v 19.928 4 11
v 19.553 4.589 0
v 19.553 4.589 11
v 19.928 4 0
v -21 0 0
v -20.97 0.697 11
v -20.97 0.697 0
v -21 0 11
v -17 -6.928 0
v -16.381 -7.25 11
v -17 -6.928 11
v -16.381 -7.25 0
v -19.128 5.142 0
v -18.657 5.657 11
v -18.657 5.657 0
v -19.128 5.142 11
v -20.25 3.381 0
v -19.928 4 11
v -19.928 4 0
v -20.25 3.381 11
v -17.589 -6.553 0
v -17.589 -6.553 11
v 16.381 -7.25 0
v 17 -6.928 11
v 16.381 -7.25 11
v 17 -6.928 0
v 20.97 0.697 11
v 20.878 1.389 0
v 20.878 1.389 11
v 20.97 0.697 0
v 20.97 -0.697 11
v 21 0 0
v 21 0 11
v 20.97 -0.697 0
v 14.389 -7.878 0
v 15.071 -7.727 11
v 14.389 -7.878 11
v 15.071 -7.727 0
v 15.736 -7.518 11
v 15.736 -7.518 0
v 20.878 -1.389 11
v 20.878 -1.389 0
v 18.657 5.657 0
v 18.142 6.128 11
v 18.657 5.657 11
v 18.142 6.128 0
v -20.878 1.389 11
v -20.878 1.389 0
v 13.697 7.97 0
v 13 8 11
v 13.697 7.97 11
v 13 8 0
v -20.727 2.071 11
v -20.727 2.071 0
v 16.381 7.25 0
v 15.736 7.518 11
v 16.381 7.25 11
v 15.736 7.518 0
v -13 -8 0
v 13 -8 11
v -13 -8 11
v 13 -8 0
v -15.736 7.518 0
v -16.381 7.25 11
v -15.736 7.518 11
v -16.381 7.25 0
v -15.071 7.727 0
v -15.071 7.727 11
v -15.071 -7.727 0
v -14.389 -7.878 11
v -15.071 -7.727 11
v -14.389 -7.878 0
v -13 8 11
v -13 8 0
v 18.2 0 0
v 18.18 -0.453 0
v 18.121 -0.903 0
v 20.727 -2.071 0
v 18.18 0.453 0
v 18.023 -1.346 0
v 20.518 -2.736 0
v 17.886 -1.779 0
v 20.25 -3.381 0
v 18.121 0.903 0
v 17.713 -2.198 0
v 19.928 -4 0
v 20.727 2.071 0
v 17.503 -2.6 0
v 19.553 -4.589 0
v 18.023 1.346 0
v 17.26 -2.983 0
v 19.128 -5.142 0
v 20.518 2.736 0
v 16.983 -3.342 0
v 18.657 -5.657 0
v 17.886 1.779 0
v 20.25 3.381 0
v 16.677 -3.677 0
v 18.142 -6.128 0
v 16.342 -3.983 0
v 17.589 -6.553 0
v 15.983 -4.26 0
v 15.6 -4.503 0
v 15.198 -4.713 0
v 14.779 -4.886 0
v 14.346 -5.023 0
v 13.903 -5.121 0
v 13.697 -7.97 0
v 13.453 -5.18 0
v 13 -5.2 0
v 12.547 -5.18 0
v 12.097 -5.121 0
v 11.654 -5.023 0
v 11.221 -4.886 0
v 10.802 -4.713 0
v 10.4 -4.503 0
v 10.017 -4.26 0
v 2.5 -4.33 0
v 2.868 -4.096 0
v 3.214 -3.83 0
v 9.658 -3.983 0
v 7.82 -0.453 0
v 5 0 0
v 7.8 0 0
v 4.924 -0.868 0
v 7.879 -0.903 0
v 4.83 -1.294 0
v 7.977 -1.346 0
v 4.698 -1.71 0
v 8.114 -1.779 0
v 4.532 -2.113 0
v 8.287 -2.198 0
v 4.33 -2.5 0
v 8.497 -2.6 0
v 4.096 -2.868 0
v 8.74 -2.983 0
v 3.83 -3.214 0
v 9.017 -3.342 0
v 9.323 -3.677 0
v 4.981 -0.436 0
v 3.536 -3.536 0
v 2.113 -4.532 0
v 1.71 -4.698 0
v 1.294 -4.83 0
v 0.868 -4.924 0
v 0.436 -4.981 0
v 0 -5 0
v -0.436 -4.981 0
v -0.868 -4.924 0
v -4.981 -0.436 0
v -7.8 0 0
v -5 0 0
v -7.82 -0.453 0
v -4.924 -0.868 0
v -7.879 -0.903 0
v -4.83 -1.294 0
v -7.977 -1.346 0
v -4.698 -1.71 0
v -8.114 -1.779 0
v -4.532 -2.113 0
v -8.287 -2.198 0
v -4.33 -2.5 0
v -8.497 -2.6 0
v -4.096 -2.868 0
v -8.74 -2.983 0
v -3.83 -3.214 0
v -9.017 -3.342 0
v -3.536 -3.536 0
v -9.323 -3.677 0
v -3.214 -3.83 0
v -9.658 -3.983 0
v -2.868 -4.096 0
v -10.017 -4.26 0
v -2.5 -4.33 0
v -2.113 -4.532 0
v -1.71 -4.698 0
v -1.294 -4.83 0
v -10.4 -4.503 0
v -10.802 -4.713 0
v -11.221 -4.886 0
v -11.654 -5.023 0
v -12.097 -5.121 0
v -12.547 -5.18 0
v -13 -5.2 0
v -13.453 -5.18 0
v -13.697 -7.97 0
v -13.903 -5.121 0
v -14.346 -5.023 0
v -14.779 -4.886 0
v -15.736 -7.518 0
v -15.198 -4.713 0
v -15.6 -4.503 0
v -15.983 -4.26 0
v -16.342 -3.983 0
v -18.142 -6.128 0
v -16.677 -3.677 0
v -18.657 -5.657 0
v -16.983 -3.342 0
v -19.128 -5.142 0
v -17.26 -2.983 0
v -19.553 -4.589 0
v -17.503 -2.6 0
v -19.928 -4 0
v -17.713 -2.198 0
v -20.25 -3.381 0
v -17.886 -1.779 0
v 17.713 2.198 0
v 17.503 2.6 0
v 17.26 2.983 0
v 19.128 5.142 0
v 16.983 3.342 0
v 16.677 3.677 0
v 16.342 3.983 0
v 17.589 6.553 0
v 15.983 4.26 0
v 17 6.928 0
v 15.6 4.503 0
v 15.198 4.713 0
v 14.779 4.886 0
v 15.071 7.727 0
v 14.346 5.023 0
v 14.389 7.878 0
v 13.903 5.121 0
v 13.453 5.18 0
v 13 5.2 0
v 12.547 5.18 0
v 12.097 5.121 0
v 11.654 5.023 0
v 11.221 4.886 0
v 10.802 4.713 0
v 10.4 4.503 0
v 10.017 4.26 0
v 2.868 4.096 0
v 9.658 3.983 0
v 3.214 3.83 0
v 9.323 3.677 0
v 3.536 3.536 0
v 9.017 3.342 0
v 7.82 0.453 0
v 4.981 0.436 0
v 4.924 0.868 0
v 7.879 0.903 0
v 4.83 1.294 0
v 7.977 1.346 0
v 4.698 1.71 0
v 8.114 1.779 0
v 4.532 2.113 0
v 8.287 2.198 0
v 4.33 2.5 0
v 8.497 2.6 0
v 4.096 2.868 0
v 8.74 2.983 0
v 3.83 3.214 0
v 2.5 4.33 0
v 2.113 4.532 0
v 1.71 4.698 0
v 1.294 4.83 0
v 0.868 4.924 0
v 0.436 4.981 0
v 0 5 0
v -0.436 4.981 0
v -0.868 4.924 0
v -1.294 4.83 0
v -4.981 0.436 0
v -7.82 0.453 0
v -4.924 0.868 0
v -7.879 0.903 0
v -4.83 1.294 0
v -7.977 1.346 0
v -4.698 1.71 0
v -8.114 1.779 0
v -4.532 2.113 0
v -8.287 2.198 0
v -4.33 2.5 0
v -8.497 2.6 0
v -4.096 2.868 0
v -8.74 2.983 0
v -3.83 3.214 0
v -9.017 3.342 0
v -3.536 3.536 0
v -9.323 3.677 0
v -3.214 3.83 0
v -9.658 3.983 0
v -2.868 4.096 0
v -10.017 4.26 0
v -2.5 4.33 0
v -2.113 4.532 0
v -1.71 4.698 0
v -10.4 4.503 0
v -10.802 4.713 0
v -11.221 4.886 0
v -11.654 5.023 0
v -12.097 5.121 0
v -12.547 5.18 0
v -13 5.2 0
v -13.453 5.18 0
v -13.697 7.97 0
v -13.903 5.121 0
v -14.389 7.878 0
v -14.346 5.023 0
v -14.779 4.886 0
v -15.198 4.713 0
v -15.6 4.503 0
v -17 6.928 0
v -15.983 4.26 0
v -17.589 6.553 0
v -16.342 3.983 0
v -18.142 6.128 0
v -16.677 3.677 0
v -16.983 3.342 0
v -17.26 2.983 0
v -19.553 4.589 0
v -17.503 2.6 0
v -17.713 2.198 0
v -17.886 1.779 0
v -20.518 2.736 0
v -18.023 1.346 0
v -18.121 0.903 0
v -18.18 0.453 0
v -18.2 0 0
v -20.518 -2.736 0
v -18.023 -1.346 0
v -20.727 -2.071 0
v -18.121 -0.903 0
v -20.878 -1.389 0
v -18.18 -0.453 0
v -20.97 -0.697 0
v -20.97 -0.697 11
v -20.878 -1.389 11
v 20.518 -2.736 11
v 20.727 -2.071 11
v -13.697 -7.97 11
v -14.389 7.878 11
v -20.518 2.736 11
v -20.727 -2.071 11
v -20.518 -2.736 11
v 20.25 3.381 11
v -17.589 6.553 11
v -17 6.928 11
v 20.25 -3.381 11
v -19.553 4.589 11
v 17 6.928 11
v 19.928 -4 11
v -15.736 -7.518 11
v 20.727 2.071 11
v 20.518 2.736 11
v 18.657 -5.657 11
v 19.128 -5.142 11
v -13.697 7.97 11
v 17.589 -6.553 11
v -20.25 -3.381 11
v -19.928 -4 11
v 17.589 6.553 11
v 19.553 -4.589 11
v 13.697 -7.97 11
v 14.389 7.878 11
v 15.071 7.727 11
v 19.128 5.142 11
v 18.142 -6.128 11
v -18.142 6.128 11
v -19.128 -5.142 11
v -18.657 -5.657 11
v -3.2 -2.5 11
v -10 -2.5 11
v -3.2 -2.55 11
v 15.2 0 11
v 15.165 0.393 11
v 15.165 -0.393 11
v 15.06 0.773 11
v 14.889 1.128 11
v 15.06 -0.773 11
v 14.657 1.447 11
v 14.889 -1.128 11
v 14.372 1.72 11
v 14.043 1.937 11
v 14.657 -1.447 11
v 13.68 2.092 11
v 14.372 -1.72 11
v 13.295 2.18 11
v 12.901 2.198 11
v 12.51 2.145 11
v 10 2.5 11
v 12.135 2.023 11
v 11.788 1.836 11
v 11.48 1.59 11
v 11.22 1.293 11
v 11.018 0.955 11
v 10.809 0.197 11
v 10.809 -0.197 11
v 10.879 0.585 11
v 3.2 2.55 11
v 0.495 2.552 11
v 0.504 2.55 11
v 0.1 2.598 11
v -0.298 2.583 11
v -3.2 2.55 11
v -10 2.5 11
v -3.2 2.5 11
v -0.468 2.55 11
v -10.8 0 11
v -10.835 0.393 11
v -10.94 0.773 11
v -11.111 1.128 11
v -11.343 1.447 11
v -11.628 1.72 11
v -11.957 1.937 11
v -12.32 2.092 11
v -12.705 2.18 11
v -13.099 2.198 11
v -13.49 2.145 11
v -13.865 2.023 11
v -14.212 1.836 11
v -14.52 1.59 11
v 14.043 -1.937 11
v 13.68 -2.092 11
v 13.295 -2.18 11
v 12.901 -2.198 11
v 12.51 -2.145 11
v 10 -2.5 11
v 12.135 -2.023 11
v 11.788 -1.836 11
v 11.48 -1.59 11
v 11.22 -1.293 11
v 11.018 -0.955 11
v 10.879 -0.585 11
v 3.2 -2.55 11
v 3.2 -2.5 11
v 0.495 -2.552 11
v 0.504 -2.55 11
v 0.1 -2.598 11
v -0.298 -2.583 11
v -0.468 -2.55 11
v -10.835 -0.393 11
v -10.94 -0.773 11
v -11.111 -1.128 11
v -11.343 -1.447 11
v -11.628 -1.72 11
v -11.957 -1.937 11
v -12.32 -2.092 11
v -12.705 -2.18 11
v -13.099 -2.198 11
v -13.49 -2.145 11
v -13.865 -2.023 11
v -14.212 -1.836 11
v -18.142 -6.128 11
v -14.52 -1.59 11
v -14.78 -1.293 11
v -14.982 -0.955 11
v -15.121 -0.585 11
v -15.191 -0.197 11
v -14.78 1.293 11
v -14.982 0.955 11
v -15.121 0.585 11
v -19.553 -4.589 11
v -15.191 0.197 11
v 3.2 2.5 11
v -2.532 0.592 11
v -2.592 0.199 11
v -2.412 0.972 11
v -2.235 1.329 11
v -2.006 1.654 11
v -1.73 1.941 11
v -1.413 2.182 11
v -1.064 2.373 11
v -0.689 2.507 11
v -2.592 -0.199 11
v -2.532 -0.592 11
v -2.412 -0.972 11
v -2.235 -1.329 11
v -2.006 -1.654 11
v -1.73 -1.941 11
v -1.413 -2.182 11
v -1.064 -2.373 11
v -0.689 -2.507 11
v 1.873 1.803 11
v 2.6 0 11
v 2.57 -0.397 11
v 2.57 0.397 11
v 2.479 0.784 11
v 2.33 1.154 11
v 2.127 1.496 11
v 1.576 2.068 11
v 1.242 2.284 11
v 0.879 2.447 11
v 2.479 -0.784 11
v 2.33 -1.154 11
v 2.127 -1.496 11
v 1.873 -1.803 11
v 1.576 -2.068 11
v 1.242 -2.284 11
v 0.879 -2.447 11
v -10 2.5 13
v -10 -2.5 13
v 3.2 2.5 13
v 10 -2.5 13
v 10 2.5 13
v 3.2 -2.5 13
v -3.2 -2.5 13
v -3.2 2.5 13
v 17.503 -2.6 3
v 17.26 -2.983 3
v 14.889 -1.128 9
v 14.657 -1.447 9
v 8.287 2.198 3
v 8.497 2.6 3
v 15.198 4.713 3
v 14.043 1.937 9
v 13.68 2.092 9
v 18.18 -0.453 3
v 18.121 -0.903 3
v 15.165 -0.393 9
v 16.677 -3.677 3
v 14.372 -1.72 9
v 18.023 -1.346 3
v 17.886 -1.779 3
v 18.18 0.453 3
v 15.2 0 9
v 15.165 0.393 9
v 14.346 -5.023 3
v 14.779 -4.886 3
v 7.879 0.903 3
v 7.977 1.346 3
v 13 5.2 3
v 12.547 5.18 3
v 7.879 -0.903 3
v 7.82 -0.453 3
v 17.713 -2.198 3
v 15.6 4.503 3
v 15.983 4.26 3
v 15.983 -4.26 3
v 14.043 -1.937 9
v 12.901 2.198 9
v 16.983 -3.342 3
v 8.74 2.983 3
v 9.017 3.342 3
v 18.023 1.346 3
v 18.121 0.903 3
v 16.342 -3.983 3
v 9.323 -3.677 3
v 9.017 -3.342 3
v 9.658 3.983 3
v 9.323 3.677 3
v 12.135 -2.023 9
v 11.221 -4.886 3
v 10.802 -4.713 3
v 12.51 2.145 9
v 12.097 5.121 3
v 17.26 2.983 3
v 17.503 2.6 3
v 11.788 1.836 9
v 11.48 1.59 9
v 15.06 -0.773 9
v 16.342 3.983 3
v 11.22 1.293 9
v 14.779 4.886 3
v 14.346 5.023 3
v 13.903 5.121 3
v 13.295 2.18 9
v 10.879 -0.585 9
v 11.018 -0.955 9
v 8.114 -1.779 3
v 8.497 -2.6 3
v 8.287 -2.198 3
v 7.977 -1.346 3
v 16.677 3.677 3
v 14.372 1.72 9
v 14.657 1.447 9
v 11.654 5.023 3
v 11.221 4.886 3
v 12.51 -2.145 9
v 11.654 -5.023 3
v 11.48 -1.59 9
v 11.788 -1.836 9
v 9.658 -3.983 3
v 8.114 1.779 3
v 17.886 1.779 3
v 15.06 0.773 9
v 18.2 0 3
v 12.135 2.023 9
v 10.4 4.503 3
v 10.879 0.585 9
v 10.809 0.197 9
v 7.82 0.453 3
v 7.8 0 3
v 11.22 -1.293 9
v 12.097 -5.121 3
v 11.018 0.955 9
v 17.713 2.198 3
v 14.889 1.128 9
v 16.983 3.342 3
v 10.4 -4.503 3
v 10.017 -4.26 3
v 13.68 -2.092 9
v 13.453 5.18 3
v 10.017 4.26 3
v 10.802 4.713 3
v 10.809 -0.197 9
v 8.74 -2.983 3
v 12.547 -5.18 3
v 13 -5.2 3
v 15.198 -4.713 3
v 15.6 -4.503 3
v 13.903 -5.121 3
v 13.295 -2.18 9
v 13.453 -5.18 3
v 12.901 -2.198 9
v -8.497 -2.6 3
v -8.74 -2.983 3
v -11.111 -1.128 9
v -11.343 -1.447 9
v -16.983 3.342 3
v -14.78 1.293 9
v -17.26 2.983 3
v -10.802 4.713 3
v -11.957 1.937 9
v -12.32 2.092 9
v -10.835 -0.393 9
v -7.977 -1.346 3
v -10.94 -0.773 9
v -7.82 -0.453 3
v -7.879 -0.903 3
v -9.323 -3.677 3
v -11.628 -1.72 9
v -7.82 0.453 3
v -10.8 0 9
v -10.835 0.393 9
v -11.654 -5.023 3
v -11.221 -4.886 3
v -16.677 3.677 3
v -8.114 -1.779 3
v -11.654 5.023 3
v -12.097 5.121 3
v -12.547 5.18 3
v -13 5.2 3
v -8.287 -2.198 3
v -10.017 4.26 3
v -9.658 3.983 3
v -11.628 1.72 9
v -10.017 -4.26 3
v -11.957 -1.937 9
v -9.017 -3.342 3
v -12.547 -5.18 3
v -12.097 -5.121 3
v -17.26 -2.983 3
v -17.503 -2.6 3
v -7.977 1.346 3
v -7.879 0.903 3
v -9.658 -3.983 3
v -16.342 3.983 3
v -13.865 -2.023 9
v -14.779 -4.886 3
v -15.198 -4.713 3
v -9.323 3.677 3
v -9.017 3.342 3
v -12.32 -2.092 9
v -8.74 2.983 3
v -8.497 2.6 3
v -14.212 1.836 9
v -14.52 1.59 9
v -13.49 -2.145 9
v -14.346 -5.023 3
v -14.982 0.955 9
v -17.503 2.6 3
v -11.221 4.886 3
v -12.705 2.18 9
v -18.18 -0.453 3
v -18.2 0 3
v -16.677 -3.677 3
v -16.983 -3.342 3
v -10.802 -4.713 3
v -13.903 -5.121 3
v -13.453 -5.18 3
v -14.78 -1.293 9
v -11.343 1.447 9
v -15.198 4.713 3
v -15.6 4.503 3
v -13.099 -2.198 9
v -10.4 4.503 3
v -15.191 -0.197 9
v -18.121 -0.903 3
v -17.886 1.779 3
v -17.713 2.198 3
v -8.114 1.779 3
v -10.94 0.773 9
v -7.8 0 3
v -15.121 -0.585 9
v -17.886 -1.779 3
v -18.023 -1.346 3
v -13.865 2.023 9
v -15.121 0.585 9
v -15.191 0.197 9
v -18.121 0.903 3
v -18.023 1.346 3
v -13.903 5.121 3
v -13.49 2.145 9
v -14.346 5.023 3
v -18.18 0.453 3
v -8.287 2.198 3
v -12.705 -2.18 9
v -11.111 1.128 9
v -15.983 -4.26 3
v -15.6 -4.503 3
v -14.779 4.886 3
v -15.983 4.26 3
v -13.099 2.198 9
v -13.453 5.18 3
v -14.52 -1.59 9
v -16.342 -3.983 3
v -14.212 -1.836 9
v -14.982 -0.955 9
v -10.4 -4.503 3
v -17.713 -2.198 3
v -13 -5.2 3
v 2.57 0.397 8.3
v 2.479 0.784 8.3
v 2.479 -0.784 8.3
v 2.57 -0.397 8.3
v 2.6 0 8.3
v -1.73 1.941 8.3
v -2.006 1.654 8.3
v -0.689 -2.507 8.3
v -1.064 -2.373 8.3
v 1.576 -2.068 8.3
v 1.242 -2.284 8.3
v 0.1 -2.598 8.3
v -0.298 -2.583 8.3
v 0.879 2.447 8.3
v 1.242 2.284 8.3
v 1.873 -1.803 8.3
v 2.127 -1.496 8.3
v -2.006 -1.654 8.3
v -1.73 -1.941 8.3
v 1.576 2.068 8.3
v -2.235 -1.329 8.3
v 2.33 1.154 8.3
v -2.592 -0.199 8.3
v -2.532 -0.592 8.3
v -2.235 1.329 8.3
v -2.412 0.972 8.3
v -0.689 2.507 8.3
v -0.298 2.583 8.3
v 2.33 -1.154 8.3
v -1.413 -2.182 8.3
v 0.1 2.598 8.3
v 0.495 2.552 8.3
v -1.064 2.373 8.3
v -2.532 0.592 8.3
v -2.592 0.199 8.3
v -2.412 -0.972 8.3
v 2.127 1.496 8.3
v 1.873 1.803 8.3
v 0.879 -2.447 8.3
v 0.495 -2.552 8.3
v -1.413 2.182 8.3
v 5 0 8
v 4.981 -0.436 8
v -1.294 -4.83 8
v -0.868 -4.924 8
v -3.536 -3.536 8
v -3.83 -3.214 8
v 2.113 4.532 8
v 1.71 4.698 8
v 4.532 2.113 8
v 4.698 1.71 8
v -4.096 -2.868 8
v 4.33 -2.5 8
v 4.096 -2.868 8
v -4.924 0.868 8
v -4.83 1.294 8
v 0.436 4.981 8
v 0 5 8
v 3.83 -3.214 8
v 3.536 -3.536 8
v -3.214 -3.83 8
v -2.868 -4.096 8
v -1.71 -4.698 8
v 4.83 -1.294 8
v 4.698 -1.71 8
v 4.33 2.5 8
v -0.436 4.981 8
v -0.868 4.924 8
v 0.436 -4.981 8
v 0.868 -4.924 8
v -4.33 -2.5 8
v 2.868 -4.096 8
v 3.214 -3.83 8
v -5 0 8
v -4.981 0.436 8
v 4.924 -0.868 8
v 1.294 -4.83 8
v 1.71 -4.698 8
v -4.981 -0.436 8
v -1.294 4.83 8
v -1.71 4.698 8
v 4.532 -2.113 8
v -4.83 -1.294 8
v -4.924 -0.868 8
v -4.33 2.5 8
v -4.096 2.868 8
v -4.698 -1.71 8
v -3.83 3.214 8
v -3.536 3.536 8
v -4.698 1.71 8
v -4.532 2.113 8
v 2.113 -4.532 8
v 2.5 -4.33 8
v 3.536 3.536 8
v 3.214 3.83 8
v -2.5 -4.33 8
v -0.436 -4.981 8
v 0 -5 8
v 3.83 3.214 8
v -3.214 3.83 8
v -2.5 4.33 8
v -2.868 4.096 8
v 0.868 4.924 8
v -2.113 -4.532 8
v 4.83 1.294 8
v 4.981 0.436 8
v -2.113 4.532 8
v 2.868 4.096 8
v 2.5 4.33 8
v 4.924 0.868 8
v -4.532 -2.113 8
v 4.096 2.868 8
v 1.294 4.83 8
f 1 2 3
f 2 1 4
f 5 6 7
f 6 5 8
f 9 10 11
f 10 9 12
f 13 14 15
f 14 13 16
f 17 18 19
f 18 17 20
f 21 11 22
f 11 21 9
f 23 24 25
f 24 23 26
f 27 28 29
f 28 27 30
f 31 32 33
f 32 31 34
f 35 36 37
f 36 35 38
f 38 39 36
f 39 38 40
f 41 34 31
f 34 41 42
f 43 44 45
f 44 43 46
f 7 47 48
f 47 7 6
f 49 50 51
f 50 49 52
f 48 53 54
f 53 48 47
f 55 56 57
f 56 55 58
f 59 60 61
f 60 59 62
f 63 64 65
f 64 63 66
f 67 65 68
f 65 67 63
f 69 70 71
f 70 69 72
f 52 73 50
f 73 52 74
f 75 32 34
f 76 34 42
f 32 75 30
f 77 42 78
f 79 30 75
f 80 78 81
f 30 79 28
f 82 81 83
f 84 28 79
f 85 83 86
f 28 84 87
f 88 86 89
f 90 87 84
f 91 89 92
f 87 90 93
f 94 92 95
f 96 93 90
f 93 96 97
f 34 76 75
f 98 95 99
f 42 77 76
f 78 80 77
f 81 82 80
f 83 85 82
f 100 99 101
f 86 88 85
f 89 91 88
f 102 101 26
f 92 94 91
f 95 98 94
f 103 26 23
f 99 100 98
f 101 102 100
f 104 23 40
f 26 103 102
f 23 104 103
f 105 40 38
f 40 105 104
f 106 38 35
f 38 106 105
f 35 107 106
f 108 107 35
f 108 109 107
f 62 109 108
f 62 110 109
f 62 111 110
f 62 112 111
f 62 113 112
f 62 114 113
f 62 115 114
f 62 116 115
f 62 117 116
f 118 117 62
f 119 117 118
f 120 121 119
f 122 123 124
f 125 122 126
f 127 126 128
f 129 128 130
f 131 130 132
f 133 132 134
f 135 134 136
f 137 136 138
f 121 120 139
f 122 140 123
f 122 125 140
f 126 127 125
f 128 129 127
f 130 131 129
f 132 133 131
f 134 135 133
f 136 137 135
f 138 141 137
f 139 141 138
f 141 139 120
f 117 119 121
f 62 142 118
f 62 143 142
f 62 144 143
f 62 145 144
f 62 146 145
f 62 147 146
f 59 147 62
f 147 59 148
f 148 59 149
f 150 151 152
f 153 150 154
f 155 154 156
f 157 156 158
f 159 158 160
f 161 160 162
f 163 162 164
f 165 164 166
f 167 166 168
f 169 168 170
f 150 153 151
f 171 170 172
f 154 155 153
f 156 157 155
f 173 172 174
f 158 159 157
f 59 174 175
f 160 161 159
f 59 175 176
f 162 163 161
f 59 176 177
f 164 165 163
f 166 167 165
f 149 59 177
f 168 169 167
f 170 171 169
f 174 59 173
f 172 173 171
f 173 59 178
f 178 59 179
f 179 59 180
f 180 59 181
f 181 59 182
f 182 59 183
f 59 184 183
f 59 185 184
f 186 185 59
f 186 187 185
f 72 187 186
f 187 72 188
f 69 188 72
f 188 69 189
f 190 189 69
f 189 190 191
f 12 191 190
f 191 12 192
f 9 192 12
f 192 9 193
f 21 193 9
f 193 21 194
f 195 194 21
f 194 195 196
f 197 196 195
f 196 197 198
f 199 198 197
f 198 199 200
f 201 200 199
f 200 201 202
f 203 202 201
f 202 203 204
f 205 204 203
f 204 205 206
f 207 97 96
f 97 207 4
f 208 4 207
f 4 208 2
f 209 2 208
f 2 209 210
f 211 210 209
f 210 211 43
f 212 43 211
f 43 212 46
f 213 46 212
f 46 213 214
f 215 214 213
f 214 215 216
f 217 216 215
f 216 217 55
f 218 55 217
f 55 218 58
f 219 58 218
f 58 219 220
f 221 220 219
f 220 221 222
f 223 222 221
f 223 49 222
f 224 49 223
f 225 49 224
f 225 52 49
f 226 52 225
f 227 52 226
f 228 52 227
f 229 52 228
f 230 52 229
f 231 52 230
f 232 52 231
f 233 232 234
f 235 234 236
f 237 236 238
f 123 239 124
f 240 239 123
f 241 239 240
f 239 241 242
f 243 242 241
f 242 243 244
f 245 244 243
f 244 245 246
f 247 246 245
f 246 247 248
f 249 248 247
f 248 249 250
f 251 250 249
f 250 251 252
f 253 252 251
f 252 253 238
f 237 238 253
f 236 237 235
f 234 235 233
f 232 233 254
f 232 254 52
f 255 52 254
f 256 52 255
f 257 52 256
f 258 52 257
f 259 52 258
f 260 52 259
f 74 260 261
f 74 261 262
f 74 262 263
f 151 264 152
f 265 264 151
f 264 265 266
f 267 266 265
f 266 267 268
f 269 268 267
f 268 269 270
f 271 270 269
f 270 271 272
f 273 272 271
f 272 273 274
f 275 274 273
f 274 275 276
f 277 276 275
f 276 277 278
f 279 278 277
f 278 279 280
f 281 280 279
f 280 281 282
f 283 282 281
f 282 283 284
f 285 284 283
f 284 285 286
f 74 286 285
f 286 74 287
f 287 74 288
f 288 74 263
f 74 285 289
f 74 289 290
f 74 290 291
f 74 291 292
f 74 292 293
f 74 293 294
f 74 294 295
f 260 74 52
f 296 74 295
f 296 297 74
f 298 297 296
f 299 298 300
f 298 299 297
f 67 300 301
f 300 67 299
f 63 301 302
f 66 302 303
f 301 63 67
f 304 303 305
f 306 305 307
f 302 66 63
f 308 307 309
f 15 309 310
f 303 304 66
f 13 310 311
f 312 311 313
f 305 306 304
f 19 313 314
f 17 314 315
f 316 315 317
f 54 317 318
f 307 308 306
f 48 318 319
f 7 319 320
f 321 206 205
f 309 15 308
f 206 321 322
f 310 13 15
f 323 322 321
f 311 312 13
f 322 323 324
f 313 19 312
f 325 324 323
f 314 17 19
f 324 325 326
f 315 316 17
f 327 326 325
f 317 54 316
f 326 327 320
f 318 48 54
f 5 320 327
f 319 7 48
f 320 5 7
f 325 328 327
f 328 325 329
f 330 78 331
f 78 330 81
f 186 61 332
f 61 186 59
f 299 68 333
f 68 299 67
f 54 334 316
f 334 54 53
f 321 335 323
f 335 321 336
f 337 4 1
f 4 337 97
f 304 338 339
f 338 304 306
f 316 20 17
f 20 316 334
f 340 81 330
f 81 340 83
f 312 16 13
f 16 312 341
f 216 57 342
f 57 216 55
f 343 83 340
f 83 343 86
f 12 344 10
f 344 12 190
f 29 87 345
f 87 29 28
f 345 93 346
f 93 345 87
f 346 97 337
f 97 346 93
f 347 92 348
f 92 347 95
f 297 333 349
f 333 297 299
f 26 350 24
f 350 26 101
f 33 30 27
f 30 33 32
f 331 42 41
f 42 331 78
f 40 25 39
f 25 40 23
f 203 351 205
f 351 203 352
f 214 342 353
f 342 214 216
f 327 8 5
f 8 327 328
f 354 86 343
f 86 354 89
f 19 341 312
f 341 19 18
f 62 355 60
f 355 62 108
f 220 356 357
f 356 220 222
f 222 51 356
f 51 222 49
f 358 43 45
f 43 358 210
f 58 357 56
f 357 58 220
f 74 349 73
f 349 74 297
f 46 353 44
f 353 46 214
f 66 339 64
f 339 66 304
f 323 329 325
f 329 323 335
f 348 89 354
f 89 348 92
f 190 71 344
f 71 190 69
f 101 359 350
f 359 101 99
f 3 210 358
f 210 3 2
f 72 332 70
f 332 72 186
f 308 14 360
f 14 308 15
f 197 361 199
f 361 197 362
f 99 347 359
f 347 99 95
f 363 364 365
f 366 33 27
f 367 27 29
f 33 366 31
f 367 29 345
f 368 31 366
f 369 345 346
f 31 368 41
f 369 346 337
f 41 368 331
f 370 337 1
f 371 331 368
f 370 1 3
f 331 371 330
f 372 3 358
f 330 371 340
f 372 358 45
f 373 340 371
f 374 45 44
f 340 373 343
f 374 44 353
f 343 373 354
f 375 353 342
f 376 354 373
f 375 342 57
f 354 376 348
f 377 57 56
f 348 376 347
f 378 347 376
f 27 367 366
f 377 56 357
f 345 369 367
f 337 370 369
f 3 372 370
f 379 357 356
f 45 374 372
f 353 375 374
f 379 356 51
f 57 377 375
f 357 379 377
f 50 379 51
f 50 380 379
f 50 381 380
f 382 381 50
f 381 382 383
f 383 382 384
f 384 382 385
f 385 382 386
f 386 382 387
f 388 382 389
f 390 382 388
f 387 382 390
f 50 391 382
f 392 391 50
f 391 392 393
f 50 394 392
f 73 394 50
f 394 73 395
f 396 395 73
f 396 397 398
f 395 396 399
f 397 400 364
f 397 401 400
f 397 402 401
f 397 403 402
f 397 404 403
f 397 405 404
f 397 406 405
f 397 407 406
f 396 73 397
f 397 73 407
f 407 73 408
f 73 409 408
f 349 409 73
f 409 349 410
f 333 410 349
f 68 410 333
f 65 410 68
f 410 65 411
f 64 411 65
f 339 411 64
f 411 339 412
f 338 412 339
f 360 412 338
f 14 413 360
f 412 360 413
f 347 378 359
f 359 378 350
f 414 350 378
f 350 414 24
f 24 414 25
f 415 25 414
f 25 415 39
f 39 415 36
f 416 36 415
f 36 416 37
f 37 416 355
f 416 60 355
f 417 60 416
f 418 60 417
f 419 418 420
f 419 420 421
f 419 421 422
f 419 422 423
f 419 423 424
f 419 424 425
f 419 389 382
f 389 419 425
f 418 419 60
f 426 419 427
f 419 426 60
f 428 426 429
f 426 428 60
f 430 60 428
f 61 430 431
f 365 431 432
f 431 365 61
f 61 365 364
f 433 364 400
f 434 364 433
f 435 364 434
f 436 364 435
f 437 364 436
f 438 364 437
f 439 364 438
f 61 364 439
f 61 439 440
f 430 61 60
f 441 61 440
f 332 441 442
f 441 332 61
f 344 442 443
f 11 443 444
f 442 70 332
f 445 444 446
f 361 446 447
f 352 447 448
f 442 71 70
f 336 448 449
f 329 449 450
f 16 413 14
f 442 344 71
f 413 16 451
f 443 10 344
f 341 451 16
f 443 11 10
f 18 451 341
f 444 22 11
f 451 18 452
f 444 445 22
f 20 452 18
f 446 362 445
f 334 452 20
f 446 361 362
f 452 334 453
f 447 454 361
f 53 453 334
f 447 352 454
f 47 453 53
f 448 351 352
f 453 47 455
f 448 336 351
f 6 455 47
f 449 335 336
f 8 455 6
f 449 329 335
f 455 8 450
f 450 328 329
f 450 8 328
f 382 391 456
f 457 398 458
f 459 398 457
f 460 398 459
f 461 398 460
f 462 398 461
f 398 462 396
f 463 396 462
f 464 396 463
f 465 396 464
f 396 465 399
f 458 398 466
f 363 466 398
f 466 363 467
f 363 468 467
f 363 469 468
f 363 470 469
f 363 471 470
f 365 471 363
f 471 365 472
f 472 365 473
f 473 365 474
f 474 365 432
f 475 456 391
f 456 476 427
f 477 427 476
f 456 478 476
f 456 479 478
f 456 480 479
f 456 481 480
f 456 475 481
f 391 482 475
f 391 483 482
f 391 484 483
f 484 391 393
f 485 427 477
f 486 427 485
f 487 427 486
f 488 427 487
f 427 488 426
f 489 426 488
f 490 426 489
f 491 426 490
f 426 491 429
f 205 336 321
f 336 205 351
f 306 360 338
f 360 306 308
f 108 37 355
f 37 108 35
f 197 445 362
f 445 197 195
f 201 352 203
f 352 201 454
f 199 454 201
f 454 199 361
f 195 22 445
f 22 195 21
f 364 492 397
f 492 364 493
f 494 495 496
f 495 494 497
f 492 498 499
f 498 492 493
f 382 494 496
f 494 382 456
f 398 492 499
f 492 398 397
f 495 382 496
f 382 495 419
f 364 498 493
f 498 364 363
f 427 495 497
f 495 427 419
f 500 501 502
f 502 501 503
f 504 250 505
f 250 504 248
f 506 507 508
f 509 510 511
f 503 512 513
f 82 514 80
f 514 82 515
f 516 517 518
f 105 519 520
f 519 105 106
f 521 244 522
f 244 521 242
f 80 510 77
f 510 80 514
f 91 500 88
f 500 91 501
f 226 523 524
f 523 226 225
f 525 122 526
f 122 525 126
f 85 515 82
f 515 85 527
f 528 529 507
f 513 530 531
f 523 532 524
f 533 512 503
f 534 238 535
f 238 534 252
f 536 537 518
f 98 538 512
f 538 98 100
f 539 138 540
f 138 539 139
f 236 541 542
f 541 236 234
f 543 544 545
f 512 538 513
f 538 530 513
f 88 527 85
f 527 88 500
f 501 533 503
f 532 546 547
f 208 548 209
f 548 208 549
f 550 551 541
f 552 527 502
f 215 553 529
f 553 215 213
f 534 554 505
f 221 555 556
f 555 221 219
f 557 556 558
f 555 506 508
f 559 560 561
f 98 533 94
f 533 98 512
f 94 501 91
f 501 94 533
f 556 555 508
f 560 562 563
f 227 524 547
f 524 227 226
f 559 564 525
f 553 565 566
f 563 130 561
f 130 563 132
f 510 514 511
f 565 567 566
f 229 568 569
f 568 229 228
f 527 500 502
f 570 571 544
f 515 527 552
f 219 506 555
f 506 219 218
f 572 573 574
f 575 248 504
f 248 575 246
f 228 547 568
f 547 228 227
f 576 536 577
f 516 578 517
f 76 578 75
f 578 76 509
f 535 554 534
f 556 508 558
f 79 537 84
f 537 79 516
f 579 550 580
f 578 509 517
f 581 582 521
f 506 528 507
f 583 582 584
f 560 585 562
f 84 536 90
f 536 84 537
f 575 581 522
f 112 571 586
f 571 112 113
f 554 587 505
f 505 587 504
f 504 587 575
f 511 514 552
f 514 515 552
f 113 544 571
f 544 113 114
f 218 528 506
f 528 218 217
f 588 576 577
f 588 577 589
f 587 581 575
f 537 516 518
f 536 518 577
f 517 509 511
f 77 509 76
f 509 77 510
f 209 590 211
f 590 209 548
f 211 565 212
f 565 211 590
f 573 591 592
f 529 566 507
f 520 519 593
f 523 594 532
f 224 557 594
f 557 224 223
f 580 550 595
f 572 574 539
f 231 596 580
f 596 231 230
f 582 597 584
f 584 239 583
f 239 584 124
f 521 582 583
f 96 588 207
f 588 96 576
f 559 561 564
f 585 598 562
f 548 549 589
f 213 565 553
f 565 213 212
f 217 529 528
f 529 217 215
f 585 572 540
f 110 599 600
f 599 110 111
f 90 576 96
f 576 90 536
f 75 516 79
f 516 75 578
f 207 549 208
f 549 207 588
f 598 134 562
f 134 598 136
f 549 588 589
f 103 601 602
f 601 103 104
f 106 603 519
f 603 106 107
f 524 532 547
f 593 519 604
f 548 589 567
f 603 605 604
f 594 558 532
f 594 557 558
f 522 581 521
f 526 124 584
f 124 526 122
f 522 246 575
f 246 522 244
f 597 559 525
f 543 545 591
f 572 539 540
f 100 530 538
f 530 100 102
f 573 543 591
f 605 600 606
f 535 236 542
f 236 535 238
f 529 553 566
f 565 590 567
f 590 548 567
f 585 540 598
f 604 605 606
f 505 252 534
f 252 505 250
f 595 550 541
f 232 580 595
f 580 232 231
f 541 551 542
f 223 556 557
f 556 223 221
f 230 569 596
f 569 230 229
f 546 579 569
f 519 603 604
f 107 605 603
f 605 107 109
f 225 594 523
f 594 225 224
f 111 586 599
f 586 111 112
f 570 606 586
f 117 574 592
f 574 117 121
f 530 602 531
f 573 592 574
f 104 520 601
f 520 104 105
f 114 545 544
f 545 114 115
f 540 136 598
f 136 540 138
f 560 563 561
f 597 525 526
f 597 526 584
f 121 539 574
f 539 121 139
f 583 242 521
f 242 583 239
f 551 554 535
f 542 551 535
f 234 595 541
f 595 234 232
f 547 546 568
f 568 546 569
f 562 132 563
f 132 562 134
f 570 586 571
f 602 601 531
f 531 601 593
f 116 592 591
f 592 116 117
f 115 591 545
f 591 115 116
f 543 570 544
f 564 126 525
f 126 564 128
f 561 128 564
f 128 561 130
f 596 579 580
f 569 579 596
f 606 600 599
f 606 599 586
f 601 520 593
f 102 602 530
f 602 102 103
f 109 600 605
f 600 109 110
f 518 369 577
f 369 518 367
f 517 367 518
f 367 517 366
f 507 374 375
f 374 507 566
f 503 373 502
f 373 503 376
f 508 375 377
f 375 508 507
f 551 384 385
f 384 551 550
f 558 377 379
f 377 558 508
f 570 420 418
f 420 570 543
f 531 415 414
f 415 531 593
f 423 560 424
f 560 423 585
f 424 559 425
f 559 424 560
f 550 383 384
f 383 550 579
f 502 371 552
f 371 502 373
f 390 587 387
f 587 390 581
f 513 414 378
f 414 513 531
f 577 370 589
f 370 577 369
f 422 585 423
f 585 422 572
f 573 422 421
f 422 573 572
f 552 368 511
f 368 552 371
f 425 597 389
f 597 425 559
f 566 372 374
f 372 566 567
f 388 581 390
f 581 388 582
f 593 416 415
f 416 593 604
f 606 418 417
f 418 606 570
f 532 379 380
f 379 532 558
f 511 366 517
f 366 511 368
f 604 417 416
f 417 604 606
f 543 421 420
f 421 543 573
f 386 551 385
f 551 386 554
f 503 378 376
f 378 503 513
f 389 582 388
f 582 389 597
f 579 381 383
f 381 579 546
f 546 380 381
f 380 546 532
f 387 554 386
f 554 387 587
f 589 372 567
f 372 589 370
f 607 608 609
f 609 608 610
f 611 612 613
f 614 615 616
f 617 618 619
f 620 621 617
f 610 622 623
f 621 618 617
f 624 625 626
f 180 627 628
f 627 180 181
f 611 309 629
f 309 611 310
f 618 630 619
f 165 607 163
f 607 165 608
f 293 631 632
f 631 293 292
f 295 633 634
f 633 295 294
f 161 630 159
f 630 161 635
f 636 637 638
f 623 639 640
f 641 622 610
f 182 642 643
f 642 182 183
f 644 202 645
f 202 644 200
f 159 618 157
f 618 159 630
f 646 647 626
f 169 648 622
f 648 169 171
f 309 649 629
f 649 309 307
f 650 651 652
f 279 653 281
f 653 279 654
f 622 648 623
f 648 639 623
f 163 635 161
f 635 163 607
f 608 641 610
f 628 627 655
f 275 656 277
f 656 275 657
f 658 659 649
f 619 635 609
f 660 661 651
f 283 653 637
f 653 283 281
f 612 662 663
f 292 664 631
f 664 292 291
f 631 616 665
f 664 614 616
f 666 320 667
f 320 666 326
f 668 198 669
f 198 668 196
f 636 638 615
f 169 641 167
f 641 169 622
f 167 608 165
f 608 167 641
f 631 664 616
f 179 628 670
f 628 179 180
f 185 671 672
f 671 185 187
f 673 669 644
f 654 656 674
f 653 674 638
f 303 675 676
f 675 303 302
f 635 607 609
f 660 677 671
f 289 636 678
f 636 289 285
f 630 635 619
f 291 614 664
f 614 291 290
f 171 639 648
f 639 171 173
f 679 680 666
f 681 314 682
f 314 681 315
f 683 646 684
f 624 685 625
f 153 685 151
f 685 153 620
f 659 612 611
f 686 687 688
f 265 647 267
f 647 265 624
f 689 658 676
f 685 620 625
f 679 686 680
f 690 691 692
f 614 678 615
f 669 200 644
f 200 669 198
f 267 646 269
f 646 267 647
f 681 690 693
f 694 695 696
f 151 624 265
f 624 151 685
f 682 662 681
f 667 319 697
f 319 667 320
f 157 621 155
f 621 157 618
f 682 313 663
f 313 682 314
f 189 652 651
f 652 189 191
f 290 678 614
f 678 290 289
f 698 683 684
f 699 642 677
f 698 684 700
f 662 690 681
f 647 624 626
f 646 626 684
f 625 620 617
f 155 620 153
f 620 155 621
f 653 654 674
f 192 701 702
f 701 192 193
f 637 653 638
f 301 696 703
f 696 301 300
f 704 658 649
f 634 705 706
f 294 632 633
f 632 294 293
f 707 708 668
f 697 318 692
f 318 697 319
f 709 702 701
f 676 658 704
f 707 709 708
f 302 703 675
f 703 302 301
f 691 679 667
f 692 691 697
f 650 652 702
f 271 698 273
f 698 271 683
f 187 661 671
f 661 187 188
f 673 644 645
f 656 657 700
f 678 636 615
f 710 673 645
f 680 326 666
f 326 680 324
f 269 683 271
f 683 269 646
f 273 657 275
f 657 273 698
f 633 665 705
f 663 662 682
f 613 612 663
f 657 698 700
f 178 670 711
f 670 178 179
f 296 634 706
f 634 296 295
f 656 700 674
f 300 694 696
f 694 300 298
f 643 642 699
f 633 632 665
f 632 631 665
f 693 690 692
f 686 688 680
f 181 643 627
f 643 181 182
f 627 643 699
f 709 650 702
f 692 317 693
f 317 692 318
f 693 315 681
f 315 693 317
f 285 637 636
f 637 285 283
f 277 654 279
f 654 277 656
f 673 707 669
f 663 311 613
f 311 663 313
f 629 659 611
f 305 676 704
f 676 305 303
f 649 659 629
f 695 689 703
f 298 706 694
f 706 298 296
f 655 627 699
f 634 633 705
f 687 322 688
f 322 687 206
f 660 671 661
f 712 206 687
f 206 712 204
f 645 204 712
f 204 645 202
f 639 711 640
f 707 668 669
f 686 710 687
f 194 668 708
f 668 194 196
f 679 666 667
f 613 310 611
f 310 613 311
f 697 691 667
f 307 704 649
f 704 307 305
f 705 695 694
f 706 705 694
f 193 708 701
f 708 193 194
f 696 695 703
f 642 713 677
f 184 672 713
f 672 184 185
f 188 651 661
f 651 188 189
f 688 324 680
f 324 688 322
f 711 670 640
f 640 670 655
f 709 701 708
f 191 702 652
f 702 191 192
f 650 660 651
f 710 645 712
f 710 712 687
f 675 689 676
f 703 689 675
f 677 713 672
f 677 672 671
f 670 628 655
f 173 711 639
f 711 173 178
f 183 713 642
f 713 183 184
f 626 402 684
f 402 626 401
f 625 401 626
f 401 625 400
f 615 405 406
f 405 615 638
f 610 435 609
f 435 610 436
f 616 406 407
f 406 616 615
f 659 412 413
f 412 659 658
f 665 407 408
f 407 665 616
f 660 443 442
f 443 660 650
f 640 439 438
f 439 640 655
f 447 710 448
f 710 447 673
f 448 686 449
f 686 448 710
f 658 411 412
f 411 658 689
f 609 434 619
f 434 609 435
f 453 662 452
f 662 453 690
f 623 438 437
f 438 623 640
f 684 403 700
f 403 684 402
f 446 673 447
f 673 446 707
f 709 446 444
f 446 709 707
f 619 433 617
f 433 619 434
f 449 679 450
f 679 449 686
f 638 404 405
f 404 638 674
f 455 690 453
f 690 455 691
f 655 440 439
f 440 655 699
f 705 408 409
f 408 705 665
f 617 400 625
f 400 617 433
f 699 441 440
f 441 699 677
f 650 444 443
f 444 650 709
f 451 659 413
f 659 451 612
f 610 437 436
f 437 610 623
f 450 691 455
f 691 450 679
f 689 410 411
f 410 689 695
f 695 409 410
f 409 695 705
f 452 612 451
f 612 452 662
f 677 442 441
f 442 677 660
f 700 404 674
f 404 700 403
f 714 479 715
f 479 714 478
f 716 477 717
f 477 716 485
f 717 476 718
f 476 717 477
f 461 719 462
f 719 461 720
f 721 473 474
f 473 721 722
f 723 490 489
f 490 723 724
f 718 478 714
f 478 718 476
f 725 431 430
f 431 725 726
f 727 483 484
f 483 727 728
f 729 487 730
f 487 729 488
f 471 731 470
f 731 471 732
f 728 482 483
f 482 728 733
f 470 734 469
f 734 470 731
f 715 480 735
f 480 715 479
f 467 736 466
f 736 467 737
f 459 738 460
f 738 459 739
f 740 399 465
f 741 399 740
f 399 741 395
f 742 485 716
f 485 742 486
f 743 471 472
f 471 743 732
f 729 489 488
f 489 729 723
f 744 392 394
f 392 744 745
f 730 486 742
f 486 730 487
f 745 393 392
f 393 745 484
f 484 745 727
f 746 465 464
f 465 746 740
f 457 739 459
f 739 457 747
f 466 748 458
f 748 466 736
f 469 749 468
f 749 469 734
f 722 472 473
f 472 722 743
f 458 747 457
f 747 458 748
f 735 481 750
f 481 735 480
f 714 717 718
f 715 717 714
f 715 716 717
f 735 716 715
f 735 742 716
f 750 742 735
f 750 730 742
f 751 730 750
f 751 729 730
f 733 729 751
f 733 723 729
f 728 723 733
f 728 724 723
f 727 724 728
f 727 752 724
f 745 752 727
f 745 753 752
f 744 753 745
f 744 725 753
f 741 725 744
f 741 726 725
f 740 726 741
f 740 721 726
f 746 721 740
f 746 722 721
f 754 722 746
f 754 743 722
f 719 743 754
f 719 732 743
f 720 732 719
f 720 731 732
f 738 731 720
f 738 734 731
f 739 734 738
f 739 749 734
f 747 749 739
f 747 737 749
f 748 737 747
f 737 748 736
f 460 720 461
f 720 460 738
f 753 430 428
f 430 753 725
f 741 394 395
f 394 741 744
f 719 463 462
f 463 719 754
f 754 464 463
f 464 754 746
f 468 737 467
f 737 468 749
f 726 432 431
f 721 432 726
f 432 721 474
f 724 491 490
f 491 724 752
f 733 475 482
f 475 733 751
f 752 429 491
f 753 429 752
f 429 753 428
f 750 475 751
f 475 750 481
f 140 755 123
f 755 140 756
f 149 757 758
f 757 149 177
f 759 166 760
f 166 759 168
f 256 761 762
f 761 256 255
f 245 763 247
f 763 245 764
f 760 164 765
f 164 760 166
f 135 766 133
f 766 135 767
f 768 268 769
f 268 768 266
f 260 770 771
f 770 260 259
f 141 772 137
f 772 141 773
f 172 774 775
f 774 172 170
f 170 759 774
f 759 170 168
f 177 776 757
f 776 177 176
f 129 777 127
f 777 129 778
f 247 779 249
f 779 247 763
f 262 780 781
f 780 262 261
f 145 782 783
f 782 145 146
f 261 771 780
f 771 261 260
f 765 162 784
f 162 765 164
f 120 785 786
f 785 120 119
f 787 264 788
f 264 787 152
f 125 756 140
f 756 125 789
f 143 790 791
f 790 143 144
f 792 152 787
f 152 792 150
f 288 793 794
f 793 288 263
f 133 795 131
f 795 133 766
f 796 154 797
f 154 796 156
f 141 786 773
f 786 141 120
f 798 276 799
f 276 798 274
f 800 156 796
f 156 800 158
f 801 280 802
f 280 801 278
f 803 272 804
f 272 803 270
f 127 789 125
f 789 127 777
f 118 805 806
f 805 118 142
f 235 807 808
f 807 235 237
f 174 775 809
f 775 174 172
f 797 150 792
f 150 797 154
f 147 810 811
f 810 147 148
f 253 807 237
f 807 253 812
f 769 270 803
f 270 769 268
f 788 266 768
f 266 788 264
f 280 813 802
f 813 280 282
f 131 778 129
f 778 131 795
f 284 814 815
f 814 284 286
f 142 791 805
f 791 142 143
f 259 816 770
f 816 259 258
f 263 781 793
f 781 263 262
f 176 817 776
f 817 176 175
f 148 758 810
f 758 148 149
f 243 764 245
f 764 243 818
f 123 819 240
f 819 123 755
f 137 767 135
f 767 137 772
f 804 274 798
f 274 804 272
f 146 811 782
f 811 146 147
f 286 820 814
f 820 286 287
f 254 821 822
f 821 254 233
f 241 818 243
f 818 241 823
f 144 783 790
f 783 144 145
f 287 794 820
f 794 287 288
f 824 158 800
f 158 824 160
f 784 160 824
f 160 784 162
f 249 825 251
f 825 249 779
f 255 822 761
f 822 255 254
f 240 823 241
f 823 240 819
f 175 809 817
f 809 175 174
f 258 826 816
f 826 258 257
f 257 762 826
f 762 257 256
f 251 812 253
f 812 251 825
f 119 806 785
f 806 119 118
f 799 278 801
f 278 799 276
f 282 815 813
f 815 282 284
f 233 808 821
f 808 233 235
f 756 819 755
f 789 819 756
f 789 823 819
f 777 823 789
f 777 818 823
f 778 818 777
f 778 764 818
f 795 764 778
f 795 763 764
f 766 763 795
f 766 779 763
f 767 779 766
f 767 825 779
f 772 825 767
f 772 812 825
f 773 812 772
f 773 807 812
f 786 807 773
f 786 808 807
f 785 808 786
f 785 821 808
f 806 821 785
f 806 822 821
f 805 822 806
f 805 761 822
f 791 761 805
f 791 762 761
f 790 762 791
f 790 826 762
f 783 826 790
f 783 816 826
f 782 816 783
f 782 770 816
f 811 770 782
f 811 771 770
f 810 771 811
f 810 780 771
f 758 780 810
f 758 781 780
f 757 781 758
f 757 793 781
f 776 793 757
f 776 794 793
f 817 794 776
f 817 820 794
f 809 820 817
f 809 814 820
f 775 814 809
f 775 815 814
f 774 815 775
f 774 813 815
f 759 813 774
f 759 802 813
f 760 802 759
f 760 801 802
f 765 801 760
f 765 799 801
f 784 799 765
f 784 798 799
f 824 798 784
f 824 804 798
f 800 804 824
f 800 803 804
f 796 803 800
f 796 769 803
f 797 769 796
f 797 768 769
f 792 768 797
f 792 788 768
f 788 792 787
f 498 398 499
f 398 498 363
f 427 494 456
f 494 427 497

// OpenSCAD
//$fn=60;
$fa=5;
$fs=.4;

feet_lenght = 42;
feet_width = 16;
feet_height = 9+2;
lock_lenght = feet_lenght - feet_width - 6;
lock_width = 5;

circle_dist = (feet_lenght - feet_width)/2;


difference(){
    body_all();
    rubber_feet_hole(x=circle_dist);
    rubber_feet_hole(x=-circle_dist);
    screw_hole();
}

module body_all(){
    linear_extrude(height=feet_height) hull(){
        translate([circle_dist,0,0]) circle(d=feet_width);
        translate([-circle_dist,0,0]) circle(d=feet_width);
    }    
    lock();
}

module screw_hole(){
    translate([0,0,-0.1]){
        translate([0,0,feet_height-2.6]) linear_extrude(height=20) circle(d=5.2);
        linear_extrude(height=feet_height-2.9) circle(d=10);
    }
    translate([0,0,feet_height]) linear_extrude(height=5) square([6.4,lock_width+0.1],center=true);
}

module rubber_feet_hole(x=0){
    translate([x,0,-0.1]){
        hull(){
            translate([0,0,9])linear_extrude(height=0.1) circle(d=4.4);
            linear_extrude(height=3.1) circle(d=10.4);
        }
        linear_extrude(height=20) circle(d=4.4);
    }
}

module lock(x=0){
    translate([x,0,0]) linear_extrude(height=feet_height+2) square([lock_lenght,lock_width],center=true);
}
